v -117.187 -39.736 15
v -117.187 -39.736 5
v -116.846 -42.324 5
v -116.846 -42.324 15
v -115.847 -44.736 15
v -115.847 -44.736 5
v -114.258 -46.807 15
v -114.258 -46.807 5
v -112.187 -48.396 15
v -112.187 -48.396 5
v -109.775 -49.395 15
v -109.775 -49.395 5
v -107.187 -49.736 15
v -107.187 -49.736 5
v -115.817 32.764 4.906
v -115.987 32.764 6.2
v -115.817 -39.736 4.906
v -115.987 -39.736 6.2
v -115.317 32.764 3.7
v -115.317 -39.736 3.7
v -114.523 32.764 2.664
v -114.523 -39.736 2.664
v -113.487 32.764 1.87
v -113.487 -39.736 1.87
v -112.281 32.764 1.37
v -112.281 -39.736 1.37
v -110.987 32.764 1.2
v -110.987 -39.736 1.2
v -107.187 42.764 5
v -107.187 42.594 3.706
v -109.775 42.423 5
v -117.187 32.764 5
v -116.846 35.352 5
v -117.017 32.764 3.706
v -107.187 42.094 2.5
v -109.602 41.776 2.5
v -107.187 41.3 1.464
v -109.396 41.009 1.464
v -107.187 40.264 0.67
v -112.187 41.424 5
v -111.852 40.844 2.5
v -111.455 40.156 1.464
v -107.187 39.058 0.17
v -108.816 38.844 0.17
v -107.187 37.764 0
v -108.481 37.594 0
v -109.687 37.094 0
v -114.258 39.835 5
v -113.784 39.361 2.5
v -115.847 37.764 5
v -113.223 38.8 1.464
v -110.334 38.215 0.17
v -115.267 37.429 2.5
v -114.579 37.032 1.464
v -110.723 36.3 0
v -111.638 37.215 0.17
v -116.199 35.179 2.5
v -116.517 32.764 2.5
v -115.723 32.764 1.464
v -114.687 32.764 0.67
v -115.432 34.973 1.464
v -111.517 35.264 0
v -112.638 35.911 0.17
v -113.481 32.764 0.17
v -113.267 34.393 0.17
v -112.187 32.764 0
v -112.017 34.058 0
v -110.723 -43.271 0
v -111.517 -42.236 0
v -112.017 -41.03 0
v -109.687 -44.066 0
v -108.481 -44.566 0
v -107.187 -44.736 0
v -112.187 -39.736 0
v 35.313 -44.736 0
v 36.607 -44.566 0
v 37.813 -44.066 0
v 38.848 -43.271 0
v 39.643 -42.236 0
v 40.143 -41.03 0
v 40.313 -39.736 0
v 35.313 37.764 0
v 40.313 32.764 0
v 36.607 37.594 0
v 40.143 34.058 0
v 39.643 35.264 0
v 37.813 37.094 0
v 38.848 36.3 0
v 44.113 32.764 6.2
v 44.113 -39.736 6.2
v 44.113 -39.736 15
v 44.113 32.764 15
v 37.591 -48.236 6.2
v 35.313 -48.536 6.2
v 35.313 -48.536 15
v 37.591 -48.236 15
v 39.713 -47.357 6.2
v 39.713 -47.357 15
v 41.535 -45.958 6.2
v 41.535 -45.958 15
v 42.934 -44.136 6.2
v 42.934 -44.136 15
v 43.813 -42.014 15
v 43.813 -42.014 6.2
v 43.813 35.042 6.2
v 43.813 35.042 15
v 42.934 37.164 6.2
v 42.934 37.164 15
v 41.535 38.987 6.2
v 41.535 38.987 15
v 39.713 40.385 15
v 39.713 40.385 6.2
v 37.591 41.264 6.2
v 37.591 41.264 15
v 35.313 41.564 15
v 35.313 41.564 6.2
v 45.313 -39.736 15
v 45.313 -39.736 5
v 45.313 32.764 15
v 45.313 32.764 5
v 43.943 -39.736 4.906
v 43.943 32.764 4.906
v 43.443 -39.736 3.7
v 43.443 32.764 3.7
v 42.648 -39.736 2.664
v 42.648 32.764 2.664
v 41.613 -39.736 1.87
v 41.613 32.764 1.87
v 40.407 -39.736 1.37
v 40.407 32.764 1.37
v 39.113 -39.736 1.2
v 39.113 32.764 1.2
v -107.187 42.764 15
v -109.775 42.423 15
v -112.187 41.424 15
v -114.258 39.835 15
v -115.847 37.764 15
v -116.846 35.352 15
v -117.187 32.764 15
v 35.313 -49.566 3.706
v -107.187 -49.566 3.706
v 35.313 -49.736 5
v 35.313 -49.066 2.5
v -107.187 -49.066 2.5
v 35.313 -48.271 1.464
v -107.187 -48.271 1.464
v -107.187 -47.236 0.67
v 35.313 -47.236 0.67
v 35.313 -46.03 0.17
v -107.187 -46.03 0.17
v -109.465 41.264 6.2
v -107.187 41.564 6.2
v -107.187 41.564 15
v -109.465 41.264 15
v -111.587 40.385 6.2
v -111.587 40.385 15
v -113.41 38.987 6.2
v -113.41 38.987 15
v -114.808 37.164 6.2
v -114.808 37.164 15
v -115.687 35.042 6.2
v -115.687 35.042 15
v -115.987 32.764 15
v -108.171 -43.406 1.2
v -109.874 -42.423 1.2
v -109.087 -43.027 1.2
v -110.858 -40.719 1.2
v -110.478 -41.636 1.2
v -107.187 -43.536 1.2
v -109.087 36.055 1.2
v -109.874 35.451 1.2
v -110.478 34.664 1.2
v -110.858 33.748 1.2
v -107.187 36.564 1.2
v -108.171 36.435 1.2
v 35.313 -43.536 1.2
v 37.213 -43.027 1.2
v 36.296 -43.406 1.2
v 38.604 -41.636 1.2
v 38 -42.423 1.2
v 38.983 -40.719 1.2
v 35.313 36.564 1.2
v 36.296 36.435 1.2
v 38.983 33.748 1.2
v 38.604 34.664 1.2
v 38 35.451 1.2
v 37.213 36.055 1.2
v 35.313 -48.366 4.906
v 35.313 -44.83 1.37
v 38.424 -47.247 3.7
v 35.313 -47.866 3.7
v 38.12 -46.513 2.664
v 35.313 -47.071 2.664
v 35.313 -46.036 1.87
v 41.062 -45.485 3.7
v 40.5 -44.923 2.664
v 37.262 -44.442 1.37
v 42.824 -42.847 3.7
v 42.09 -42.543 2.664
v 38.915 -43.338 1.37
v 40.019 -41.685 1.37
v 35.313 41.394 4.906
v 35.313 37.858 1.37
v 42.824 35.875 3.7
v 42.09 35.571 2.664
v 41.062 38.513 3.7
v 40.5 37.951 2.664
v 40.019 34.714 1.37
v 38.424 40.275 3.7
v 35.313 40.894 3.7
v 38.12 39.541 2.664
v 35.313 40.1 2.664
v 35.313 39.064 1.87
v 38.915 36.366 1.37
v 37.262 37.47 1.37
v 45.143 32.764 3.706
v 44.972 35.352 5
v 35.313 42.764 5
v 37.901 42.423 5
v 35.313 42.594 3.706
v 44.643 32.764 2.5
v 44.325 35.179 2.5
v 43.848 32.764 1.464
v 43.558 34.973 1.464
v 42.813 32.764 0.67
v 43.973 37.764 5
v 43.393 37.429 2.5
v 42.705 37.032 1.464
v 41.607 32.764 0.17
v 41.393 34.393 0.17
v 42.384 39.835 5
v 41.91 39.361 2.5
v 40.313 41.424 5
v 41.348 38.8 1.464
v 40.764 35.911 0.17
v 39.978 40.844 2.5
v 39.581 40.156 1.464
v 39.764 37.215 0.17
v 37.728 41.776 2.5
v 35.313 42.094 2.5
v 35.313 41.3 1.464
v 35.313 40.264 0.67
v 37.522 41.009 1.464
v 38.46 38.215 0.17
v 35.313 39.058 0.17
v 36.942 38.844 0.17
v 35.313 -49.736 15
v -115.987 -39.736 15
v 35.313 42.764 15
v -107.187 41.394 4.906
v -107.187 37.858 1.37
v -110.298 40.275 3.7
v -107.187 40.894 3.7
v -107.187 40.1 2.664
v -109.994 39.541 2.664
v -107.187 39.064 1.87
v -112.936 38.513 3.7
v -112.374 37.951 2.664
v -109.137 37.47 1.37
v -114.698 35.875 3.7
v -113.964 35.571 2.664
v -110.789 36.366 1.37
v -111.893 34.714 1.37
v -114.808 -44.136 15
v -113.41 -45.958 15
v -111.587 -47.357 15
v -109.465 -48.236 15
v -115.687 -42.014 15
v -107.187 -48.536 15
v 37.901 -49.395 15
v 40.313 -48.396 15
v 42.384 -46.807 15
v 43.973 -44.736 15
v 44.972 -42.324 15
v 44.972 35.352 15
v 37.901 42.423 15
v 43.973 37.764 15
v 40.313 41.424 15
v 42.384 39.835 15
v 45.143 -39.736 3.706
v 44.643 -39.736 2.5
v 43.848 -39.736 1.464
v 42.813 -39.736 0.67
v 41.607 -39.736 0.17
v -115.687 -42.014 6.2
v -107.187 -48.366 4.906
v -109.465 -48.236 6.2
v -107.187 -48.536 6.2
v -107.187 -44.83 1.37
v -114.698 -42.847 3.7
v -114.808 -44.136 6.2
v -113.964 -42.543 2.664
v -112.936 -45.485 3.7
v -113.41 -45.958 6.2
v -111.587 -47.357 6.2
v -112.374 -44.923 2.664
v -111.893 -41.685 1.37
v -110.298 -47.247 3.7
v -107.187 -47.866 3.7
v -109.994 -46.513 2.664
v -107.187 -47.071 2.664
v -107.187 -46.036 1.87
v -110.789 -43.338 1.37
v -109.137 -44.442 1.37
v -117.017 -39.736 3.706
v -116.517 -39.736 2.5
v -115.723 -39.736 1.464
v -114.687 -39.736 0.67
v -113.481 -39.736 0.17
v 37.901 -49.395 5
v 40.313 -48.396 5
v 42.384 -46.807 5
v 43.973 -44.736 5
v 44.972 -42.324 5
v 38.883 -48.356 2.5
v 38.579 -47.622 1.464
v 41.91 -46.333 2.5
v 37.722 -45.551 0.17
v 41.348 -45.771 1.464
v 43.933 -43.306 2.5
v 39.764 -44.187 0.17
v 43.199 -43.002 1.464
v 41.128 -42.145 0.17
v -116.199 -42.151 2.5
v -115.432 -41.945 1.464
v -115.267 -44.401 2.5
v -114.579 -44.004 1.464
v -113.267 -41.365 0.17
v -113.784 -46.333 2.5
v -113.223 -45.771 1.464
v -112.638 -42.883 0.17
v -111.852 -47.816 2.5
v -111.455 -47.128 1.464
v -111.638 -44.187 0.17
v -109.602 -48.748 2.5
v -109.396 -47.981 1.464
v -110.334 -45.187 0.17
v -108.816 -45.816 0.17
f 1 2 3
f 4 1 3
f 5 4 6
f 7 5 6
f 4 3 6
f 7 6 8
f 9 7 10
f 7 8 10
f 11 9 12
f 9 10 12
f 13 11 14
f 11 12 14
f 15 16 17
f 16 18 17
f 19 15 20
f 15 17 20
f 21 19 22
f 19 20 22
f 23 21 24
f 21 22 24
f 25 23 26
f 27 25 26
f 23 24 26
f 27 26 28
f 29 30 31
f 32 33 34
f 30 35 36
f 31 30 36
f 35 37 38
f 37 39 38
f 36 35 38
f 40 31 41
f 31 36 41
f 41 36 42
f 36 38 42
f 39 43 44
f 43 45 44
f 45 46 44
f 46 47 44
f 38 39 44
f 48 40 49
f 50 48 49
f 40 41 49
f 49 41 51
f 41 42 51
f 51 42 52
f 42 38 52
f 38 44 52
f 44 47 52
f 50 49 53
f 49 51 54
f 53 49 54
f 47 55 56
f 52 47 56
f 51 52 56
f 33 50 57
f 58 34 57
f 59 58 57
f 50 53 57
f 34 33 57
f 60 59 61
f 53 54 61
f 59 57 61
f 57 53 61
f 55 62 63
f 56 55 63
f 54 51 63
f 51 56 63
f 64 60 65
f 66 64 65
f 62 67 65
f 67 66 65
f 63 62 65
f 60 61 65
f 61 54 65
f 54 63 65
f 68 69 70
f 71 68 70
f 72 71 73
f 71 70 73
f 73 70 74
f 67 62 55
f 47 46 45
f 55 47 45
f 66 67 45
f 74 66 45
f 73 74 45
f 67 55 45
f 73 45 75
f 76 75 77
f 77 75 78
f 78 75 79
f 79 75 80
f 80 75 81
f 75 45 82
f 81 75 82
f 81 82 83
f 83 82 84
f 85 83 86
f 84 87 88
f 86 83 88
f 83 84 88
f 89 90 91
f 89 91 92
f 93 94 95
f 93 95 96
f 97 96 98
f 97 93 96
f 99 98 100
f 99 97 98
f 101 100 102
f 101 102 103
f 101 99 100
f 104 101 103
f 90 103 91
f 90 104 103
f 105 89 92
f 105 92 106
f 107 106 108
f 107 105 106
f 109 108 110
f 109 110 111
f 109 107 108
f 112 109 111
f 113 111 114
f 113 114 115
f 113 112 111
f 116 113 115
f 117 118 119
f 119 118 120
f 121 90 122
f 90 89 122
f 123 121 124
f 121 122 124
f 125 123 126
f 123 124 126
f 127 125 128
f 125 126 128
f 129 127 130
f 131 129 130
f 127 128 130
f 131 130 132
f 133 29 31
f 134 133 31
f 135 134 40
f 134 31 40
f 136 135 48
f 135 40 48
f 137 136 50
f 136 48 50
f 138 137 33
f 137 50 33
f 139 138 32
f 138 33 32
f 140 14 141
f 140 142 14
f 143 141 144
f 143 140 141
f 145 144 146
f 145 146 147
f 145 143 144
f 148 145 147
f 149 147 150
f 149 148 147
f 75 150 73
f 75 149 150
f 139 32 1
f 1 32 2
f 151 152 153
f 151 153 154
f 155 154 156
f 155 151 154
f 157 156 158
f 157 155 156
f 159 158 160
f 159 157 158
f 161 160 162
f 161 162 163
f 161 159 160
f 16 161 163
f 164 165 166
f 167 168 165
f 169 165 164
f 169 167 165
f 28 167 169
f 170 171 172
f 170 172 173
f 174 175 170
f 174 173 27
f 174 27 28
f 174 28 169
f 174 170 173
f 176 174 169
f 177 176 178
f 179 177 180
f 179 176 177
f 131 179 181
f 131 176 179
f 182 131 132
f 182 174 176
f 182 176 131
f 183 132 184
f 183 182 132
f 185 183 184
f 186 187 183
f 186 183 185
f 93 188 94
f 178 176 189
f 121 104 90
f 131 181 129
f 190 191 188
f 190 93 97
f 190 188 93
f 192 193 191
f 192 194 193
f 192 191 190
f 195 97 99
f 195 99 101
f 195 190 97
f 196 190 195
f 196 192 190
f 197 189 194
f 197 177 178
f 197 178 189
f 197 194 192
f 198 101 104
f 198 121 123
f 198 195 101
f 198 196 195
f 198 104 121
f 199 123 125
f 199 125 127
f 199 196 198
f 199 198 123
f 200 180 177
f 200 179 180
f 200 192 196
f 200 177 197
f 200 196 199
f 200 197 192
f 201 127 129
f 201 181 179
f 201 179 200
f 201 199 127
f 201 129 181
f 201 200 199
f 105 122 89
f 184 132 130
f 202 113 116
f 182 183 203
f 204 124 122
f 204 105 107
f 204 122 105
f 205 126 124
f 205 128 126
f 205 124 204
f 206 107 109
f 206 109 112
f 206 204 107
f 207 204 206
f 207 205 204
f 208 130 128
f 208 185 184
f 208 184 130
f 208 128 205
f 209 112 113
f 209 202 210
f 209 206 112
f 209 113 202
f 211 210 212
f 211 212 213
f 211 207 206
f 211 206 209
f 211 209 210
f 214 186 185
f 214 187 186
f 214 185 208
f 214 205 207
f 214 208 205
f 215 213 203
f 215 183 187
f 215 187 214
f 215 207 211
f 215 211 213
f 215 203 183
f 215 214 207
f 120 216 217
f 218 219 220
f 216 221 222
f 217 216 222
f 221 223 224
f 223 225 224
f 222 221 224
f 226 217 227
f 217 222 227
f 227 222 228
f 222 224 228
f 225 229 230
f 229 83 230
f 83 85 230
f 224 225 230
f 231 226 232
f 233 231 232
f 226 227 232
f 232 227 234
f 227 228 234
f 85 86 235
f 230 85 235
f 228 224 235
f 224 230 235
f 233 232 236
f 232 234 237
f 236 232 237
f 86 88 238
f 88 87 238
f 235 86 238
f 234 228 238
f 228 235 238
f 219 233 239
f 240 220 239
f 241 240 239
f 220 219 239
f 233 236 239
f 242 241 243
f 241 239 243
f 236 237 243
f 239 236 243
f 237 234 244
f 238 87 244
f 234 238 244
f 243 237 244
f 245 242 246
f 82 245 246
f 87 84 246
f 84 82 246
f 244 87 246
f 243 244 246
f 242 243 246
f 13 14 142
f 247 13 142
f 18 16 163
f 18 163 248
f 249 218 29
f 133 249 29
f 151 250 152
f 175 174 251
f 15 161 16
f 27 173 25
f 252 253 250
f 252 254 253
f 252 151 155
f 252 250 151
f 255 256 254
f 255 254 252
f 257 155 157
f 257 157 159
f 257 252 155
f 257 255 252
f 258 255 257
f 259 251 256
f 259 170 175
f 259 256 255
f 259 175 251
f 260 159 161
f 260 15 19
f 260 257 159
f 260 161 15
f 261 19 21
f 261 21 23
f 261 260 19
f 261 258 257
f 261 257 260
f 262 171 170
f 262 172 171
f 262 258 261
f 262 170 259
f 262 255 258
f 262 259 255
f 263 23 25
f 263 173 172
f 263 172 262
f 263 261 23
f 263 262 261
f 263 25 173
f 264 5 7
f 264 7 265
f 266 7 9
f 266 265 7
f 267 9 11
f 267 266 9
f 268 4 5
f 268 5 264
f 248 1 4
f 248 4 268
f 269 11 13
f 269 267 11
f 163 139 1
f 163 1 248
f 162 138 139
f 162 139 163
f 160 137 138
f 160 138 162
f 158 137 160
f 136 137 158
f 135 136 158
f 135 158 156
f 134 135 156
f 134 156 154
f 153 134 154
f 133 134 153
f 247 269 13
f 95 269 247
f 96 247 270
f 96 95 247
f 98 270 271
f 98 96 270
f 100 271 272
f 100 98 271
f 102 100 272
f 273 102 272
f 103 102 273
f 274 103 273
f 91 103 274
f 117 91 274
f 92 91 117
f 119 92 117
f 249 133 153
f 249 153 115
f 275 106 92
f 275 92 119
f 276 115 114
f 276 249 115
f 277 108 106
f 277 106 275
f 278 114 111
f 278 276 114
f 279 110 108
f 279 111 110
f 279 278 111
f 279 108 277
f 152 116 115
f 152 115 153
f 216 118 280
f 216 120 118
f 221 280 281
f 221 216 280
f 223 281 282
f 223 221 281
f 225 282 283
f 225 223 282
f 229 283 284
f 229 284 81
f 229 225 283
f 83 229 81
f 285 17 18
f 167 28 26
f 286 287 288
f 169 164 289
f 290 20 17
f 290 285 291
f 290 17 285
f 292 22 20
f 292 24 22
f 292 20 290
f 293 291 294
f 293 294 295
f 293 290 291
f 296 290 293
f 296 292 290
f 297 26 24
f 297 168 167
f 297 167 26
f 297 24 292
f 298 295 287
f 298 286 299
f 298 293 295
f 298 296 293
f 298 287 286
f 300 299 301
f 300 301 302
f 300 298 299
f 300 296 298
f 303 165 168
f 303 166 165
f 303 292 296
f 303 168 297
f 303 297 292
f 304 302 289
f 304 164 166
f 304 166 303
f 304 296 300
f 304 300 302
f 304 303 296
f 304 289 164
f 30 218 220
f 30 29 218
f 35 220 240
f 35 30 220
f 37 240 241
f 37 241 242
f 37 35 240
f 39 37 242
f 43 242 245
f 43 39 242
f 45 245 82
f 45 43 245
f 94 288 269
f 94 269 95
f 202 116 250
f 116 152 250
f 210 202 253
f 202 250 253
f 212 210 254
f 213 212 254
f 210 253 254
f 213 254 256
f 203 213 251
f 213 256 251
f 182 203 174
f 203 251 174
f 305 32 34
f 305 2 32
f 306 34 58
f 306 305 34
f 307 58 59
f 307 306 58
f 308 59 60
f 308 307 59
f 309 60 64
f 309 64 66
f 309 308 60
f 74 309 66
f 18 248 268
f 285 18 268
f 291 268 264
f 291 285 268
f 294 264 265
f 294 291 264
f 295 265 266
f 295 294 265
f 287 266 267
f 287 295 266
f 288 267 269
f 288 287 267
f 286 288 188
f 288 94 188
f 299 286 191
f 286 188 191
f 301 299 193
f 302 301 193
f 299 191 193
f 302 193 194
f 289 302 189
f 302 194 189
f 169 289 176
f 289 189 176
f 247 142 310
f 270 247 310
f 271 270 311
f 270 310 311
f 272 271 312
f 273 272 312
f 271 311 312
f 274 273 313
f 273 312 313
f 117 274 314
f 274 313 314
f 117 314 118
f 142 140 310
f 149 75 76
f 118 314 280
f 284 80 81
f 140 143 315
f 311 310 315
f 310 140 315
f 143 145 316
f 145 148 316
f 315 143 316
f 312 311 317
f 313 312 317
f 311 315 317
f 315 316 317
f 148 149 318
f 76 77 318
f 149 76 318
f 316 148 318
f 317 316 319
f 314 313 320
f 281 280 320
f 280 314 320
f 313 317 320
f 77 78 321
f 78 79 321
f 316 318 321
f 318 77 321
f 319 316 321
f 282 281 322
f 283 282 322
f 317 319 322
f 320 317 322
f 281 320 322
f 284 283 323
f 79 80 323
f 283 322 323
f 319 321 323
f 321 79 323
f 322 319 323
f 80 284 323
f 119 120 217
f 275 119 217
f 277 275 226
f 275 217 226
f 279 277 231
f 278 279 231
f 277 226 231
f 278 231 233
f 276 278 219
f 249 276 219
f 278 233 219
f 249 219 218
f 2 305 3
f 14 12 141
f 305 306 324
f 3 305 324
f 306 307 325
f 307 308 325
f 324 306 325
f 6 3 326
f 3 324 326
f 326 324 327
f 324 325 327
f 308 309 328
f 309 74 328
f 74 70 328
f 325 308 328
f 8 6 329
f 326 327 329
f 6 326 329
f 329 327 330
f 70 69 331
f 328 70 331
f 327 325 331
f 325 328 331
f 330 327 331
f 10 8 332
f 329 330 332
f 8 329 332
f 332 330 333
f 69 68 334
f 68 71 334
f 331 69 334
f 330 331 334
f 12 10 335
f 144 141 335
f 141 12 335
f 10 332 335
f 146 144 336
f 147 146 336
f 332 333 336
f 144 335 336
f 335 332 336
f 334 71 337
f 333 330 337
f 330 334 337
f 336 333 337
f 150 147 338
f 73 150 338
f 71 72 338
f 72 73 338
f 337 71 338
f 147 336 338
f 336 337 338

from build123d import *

# Parameters (mm, degrees)
F1_DEPTH = 15
F2_T     = -1.2
F3_R     = 5
F4_R     = 5


with BuildPart() as f1:
    # F0 (on Top) → F1 (new body)
    with BuildSketch(Plane.XY):
        with BuildLine():
            Line((35.3129135817, 42.7640778485), (-107.1870864183, 42.7640778485))
            ThreePointArc((-107.1870864183, 42.7640778485), (-114.2581542301, 39.8351456603), (-117.1870864183, 32.7640778485))
            Line((-117.1870864183, 32.7640778485), (-117.1870864183, -39.7359221515))
            ThreePointArc((-117.1870864183, -39.7359221515), (-114.2581542301, -46.8069899634), (-107.1870864183, -49.7359221515))
            Line((-107.1870864183, -49.7359221515), (35.3129135817, -49.7359221515))
            ThreePointArc((35.3129135817, -49.7359221515), (42.3839813936, -46.8069899634), (45.3129135817, -39.7359221515))
            Line((45.3129135817, -39.7359221515), (45.3129135817, 32.7640778485))
            ThreePointArc((45.3129135817, 32.7640778485), (42.3839813936, 39.8351456603), (35.3129135817, 42.7640778485))
        make_face()
    extrude(amount=F1_DEPTH)

    # F2
    f2_openings = [f1.faces().sort_by_distance(p)[0] for p in [
        (-35.937086, -3.485922, 15),
    ]]
    offset(amount=F2_T, openings=f2_openings)

    # F3
    f3_edges = [f1.edges().sort_by_distance(p)[0] for p in [
        (-35.937086, 41.564078, 1.2),
        (-113.409626, 38.986618, 1.2),
        (-115.987086, -3.485922, 1.2),
        (-113.409626, -45.958462, 1.2),
        (-35.937086, -48.535922, 1.2),
        (41.535453, -45.958462, 1.2),
        (44.112914, -3.485922, 1.2),
        (41.535453, 38.986618, 1.2),
    ]]
    fillet(f3_edges, radius=F3_R)

    # F4
    f4_edges = [f1.edges().sort_by_distance(p)[0] for p in [
        (-35.937086, 42.764078, 0),
        (-114.258154, 39.835146, 0),
        (-117.187086, -3.485922, 0),
        (-114.258154, -46.80699, 0),
        (-35.937086, -49.735922, 0),
        (42.383981, -46.80699, 0),
        (45.312914, -3.485922, 0),
        (42.383981, 39.835146, 0),
    ]]
    fillet(f4_edges, radius=F4_R)


solid = f1.part
